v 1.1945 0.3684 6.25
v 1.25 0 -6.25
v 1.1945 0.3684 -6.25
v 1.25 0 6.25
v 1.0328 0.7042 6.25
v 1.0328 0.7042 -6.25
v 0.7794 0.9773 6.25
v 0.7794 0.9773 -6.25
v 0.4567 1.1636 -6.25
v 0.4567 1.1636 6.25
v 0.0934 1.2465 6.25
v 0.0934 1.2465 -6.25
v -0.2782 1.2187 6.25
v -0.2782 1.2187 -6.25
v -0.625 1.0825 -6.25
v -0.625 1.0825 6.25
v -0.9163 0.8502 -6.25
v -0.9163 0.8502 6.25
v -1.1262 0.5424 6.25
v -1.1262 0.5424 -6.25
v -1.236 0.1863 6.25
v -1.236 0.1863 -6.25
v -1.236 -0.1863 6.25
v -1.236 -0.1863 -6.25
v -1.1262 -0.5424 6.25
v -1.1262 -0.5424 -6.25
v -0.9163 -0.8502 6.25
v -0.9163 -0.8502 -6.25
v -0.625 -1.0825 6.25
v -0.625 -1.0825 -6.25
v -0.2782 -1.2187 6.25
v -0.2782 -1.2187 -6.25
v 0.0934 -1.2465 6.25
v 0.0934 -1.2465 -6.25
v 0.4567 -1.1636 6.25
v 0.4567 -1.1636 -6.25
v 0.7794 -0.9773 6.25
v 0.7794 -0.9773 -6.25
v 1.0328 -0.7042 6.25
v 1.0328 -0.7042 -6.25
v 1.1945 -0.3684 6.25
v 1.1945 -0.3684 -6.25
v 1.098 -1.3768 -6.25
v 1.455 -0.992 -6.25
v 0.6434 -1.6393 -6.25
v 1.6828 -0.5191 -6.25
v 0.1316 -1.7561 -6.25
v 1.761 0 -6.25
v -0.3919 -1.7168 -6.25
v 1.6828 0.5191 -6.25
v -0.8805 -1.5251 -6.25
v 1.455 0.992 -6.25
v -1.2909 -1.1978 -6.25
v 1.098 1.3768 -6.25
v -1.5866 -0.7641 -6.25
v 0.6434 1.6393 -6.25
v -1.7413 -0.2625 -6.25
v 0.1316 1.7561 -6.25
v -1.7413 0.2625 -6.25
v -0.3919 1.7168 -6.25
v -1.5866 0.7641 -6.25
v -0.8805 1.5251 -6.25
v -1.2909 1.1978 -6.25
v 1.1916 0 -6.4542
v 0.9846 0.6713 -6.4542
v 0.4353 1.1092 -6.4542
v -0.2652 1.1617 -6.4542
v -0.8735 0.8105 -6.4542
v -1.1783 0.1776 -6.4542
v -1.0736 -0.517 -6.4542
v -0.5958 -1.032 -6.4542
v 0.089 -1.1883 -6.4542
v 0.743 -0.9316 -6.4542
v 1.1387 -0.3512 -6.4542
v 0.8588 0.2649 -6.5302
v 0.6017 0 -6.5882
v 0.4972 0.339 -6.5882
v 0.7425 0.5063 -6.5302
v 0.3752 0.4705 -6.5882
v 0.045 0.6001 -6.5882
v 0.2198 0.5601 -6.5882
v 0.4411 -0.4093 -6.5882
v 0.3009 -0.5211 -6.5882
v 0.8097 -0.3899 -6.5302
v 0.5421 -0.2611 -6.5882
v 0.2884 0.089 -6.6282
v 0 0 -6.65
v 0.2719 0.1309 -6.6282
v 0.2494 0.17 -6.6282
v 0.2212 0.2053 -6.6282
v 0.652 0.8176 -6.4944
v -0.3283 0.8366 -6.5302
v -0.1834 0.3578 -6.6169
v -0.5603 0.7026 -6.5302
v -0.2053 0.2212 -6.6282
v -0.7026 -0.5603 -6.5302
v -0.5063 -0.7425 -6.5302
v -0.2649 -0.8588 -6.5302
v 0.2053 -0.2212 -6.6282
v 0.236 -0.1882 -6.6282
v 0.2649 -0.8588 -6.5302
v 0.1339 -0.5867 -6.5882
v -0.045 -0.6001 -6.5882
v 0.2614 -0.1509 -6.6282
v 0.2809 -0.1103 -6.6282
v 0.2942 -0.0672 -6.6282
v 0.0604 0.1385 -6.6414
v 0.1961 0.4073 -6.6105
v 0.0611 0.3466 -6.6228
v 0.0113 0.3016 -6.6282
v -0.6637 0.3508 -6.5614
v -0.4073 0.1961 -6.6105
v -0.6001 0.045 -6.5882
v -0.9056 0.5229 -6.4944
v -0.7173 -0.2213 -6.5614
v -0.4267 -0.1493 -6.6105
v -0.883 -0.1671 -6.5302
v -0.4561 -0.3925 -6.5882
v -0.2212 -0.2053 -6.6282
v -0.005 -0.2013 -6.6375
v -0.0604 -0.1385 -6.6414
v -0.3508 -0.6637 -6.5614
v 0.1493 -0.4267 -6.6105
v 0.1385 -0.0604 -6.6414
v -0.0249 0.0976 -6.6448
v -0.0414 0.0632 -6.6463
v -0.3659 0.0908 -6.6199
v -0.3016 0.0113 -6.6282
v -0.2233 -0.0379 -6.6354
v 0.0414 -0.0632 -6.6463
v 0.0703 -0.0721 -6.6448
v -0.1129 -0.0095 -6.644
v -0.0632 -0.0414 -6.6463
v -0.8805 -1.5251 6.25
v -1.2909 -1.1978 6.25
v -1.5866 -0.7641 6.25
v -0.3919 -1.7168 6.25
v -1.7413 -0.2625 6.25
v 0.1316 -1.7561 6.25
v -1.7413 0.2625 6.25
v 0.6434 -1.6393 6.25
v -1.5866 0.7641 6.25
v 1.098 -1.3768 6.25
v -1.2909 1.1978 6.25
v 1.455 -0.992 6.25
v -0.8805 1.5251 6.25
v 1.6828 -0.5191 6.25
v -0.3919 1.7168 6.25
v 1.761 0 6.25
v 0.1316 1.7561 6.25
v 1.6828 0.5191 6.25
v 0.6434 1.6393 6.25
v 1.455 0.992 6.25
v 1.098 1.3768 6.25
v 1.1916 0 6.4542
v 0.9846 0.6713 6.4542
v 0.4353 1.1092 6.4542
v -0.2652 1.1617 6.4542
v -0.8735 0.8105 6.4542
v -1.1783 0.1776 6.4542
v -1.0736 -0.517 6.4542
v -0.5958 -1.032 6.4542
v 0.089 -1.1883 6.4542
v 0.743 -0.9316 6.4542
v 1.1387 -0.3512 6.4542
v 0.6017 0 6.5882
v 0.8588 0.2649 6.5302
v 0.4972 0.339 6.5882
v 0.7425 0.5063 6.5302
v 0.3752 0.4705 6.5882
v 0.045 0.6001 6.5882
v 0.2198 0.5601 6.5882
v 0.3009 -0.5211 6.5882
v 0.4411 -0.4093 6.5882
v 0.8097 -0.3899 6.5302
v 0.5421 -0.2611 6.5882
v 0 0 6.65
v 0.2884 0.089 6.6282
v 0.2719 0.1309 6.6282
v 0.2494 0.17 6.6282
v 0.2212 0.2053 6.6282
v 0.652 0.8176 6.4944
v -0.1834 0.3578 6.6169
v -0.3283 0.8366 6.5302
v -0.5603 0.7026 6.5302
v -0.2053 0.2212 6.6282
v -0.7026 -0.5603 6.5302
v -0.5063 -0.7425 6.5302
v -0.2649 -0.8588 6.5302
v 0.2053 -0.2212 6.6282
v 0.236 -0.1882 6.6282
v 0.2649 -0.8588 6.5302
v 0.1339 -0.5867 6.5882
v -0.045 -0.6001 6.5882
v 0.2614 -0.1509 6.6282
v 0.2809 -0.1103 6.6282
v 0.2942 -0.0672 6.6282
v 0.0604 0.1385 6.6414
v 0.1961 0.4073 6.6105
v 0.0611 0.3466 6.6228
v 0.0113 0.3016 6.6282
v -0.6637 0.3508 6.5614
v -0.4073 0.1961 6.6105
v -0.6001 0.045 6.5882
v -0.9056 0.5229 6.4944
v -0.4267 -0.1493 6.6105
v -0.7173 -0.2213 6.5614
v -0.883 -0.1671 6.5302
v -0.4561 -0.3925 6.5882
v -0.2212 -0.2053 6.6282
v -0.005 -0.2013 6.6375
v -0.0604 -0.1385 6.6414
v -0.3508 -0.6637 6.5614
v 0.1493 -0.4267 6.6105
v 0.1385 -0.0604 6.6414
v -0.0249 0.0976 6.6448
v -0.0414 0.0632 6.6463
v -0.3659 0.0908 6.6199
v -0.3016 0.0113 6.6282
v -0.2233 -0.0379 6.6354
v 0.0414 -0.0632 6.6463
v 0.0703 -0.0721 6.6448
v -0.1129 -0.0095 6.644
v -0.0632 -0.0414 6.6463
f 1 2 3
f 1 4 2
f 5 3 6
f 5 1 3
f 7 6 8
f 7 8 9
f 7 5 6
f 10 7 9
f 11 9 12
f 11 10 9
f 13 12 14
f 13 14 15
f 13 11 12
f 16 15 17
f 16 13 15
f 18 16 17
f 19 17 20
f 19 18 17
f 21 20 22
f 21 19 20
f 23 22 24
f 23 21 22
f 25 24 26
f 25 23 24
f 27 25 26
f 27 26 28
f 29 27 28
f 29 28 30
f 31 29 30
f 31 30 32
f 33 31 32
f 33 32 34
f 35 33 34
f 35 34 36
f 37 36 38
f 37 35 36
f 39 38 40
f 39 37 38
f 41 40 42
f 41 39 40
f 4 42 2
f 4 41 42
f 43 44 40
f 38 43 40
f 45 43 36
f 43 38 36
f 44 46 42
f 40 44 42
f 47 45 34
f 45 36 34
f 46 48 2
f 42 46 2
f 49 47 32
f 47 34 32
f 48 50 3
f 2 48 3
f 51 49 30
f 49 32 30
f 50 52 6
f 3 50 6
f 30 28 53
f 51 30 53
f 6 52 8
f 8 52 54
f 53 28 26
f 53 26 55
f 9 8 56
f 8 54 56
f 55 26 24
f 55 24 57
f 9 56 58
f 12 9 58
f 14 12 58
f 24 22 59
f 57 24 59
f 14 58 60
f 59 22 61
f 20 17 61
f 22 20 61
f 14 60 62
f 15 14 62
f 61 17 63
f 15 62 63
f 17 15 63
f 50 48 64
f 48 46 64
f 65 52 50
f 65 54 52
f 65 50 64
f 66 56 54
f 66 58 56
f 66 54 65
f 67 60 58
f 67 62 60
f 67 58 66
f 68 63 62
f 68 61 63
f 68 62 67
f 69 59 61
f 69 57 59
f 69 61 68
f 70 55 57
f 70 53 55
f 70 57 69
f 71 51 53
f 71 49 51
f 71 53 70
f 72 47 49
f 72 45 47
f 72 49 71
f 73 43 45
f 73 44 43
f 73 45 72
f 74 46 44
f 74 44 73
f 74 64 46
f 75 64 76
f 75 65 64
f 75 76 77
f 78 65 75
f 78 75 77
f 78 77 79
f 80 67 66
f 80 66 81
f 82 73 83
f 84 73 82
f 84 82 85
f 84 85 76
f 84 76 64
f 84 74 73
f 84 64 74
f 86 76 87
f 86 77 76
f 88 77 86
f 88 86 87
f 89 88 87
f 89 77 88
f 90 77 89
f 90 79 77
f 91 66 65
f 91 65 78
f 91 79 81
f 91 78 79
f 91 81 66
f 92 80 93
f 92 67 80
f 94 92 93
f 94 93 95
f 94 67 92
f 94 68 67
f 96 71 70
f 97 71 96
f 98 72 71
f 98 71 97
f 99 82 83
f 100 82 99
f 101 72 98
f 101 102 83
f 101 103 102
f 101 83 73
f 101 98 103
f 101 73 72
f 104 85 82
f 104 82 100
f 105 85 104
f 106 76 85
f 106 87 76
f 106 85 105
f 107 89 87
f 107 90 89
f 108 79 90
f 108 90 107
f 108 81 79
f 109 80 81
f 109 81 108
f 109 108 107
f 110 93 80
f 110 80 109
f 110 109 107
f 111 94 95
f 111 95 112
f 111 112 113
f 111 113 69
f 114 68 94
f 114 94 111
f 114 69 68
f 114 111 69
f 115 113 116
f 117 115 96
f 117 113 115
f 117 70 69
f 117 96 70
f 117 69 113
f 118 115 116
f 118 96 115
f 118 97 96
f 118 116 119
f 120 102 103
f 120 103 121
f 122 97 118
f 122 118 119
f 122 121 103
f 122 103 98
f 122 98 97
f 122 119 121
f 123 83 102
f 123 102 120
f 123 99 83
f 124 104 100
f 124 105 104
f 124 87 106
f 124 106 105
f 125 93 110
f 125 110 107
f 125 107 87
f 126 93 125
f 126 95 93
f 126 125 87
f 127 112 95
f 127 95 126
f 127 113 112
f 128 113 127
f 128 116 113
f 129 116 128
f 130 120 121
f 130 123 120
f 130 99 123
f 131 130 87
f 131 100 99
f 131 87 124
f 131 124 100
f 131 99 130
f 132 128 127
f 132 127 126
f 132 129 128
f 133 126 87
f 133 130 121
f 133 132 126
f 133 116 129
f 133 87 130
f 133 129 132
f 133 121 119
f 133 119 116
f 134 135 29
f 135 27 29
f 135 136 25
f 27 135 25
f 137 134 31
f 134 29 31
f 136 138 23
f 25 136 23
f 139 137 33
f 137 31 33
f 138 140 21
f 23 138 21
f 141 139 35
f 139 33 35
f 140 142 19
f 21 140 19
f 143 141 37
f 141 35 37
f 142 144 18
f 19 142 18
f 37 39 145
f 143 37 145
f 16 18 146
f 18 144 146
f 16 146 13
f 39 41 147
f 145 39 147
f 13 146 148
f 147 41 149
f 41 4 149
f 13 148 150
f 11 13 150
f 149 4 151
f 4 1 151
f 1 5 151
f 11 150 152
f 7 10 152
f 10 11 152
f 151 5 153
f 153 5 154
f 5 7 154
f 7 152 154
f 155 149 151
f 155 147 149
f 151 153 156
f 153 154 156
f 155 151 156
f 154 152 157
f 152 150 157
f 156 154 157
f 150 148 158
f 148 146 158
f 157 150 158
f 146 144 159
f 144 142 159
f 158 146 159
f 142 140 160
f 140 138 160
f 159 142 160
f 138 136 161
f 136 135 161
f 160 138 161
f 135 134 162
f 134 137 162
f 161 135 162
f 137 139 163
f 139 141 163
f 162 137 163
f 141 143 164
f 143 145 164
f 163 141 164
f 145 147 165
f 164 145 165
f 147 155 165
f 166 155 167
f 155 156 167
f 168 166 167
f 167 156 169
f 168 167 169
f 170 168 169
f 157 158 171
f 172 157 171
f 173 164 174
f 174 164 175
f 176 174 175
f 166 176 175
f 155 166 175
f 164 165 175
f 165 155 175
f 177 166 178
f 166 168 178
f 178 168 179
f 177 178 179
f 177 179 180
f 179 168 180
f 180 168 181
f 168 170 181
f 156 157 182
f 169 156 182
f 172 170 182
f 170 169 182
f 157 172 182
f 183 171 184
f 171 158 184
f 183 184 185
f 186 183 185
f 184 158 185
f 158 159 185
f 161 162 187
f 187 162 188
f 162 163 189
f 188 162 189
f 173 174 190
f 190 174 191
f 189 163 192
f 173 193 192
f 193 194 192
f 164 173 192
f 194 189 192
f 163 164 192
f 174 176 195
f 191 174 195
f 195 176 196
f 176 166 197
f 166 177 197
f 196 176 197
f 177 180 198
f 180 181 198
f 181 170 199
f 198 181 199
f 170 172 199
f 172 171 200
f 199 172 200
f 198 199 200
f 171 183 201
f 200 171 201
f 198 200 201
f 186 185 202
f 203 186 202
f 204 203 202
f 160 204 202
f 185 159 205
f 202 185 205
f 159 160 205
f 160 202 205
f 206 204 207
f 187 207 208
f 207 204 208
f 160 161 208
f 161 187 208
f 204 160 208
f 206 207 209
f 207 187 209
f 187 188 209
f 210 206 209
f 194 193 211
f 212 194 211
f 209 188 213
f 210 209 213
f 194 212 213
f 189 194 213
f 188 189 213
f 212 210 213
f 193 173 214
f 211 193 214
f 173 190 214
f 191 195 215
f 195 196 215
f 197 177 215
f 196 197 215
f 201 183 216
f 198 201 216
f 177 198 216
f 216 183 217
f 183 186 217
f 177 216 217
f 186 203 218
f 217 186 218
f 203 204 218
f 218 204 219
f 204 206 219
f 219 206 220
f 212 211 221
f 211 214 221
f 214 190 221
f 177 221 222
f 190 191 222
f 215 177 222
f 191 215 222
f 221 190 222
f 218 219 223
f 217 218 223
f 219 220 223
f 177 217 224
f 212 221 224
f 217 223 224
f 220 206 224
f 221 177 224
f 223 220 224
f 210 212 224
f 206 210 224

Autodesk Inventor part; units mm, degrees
ref_plane "YZ Plane" through (0, 0, 0) normal (1, 0, 0) x (0, 1, 0)
ref_plane "XZ Plane" through (0, 0, 0) normal (0, 1, 0) x (-1, 0, 0)
ref_plane "XY Plane" through (0, 0, 0) normal (0, 0, 1) x (1, 0, 0)
sketch "Sketch2" plane through (0, 0, 0) normal (0, 0, 1) x (1, 0, 0)
  circle A0 centre (0, 0) radius 1.25
  dimension "d44" = 2.5
extrude "Extrusion8" add sketch "Sketch2" along normal mid plane 12.5
sketch "Sketch3" plane through (0, 0, 6.25) normal (0, 0, 1) x (1, 0, 0)
  circle A0 centre (0, 0) radius 1.75
  dimension "d47" = 3.5
sketch "Sketch4" plane through (0, 0, 0) normal (0, 1, 0) x (-1, 0, 0)
  line L0 (1.25, 6.25) -> (-1.25, 6.25) projected
  line L1 (0, 6.25) -> (0, 6.65)
  arc A0 (0, 6.65) -> (-1.761, 6.25) centre (0.2088, 1.6544) ccw
  line L2 (0, 6.25) -> (-1.761, 6.25)
  point P0 (0, 0)
  dimension "d48" = 0.4
  dimension "d49" = 5
revolve "Revolution1" add sketch "Sketch4" angle 360 about axis through (0, 0, 6.25) along (0, 0, 1)
mirror "Mirror1" about plane through (0, 0, 0) normal (0, 0, 1) of "Revolution1"
properties part number "link7" material "Aluminum 6061"
